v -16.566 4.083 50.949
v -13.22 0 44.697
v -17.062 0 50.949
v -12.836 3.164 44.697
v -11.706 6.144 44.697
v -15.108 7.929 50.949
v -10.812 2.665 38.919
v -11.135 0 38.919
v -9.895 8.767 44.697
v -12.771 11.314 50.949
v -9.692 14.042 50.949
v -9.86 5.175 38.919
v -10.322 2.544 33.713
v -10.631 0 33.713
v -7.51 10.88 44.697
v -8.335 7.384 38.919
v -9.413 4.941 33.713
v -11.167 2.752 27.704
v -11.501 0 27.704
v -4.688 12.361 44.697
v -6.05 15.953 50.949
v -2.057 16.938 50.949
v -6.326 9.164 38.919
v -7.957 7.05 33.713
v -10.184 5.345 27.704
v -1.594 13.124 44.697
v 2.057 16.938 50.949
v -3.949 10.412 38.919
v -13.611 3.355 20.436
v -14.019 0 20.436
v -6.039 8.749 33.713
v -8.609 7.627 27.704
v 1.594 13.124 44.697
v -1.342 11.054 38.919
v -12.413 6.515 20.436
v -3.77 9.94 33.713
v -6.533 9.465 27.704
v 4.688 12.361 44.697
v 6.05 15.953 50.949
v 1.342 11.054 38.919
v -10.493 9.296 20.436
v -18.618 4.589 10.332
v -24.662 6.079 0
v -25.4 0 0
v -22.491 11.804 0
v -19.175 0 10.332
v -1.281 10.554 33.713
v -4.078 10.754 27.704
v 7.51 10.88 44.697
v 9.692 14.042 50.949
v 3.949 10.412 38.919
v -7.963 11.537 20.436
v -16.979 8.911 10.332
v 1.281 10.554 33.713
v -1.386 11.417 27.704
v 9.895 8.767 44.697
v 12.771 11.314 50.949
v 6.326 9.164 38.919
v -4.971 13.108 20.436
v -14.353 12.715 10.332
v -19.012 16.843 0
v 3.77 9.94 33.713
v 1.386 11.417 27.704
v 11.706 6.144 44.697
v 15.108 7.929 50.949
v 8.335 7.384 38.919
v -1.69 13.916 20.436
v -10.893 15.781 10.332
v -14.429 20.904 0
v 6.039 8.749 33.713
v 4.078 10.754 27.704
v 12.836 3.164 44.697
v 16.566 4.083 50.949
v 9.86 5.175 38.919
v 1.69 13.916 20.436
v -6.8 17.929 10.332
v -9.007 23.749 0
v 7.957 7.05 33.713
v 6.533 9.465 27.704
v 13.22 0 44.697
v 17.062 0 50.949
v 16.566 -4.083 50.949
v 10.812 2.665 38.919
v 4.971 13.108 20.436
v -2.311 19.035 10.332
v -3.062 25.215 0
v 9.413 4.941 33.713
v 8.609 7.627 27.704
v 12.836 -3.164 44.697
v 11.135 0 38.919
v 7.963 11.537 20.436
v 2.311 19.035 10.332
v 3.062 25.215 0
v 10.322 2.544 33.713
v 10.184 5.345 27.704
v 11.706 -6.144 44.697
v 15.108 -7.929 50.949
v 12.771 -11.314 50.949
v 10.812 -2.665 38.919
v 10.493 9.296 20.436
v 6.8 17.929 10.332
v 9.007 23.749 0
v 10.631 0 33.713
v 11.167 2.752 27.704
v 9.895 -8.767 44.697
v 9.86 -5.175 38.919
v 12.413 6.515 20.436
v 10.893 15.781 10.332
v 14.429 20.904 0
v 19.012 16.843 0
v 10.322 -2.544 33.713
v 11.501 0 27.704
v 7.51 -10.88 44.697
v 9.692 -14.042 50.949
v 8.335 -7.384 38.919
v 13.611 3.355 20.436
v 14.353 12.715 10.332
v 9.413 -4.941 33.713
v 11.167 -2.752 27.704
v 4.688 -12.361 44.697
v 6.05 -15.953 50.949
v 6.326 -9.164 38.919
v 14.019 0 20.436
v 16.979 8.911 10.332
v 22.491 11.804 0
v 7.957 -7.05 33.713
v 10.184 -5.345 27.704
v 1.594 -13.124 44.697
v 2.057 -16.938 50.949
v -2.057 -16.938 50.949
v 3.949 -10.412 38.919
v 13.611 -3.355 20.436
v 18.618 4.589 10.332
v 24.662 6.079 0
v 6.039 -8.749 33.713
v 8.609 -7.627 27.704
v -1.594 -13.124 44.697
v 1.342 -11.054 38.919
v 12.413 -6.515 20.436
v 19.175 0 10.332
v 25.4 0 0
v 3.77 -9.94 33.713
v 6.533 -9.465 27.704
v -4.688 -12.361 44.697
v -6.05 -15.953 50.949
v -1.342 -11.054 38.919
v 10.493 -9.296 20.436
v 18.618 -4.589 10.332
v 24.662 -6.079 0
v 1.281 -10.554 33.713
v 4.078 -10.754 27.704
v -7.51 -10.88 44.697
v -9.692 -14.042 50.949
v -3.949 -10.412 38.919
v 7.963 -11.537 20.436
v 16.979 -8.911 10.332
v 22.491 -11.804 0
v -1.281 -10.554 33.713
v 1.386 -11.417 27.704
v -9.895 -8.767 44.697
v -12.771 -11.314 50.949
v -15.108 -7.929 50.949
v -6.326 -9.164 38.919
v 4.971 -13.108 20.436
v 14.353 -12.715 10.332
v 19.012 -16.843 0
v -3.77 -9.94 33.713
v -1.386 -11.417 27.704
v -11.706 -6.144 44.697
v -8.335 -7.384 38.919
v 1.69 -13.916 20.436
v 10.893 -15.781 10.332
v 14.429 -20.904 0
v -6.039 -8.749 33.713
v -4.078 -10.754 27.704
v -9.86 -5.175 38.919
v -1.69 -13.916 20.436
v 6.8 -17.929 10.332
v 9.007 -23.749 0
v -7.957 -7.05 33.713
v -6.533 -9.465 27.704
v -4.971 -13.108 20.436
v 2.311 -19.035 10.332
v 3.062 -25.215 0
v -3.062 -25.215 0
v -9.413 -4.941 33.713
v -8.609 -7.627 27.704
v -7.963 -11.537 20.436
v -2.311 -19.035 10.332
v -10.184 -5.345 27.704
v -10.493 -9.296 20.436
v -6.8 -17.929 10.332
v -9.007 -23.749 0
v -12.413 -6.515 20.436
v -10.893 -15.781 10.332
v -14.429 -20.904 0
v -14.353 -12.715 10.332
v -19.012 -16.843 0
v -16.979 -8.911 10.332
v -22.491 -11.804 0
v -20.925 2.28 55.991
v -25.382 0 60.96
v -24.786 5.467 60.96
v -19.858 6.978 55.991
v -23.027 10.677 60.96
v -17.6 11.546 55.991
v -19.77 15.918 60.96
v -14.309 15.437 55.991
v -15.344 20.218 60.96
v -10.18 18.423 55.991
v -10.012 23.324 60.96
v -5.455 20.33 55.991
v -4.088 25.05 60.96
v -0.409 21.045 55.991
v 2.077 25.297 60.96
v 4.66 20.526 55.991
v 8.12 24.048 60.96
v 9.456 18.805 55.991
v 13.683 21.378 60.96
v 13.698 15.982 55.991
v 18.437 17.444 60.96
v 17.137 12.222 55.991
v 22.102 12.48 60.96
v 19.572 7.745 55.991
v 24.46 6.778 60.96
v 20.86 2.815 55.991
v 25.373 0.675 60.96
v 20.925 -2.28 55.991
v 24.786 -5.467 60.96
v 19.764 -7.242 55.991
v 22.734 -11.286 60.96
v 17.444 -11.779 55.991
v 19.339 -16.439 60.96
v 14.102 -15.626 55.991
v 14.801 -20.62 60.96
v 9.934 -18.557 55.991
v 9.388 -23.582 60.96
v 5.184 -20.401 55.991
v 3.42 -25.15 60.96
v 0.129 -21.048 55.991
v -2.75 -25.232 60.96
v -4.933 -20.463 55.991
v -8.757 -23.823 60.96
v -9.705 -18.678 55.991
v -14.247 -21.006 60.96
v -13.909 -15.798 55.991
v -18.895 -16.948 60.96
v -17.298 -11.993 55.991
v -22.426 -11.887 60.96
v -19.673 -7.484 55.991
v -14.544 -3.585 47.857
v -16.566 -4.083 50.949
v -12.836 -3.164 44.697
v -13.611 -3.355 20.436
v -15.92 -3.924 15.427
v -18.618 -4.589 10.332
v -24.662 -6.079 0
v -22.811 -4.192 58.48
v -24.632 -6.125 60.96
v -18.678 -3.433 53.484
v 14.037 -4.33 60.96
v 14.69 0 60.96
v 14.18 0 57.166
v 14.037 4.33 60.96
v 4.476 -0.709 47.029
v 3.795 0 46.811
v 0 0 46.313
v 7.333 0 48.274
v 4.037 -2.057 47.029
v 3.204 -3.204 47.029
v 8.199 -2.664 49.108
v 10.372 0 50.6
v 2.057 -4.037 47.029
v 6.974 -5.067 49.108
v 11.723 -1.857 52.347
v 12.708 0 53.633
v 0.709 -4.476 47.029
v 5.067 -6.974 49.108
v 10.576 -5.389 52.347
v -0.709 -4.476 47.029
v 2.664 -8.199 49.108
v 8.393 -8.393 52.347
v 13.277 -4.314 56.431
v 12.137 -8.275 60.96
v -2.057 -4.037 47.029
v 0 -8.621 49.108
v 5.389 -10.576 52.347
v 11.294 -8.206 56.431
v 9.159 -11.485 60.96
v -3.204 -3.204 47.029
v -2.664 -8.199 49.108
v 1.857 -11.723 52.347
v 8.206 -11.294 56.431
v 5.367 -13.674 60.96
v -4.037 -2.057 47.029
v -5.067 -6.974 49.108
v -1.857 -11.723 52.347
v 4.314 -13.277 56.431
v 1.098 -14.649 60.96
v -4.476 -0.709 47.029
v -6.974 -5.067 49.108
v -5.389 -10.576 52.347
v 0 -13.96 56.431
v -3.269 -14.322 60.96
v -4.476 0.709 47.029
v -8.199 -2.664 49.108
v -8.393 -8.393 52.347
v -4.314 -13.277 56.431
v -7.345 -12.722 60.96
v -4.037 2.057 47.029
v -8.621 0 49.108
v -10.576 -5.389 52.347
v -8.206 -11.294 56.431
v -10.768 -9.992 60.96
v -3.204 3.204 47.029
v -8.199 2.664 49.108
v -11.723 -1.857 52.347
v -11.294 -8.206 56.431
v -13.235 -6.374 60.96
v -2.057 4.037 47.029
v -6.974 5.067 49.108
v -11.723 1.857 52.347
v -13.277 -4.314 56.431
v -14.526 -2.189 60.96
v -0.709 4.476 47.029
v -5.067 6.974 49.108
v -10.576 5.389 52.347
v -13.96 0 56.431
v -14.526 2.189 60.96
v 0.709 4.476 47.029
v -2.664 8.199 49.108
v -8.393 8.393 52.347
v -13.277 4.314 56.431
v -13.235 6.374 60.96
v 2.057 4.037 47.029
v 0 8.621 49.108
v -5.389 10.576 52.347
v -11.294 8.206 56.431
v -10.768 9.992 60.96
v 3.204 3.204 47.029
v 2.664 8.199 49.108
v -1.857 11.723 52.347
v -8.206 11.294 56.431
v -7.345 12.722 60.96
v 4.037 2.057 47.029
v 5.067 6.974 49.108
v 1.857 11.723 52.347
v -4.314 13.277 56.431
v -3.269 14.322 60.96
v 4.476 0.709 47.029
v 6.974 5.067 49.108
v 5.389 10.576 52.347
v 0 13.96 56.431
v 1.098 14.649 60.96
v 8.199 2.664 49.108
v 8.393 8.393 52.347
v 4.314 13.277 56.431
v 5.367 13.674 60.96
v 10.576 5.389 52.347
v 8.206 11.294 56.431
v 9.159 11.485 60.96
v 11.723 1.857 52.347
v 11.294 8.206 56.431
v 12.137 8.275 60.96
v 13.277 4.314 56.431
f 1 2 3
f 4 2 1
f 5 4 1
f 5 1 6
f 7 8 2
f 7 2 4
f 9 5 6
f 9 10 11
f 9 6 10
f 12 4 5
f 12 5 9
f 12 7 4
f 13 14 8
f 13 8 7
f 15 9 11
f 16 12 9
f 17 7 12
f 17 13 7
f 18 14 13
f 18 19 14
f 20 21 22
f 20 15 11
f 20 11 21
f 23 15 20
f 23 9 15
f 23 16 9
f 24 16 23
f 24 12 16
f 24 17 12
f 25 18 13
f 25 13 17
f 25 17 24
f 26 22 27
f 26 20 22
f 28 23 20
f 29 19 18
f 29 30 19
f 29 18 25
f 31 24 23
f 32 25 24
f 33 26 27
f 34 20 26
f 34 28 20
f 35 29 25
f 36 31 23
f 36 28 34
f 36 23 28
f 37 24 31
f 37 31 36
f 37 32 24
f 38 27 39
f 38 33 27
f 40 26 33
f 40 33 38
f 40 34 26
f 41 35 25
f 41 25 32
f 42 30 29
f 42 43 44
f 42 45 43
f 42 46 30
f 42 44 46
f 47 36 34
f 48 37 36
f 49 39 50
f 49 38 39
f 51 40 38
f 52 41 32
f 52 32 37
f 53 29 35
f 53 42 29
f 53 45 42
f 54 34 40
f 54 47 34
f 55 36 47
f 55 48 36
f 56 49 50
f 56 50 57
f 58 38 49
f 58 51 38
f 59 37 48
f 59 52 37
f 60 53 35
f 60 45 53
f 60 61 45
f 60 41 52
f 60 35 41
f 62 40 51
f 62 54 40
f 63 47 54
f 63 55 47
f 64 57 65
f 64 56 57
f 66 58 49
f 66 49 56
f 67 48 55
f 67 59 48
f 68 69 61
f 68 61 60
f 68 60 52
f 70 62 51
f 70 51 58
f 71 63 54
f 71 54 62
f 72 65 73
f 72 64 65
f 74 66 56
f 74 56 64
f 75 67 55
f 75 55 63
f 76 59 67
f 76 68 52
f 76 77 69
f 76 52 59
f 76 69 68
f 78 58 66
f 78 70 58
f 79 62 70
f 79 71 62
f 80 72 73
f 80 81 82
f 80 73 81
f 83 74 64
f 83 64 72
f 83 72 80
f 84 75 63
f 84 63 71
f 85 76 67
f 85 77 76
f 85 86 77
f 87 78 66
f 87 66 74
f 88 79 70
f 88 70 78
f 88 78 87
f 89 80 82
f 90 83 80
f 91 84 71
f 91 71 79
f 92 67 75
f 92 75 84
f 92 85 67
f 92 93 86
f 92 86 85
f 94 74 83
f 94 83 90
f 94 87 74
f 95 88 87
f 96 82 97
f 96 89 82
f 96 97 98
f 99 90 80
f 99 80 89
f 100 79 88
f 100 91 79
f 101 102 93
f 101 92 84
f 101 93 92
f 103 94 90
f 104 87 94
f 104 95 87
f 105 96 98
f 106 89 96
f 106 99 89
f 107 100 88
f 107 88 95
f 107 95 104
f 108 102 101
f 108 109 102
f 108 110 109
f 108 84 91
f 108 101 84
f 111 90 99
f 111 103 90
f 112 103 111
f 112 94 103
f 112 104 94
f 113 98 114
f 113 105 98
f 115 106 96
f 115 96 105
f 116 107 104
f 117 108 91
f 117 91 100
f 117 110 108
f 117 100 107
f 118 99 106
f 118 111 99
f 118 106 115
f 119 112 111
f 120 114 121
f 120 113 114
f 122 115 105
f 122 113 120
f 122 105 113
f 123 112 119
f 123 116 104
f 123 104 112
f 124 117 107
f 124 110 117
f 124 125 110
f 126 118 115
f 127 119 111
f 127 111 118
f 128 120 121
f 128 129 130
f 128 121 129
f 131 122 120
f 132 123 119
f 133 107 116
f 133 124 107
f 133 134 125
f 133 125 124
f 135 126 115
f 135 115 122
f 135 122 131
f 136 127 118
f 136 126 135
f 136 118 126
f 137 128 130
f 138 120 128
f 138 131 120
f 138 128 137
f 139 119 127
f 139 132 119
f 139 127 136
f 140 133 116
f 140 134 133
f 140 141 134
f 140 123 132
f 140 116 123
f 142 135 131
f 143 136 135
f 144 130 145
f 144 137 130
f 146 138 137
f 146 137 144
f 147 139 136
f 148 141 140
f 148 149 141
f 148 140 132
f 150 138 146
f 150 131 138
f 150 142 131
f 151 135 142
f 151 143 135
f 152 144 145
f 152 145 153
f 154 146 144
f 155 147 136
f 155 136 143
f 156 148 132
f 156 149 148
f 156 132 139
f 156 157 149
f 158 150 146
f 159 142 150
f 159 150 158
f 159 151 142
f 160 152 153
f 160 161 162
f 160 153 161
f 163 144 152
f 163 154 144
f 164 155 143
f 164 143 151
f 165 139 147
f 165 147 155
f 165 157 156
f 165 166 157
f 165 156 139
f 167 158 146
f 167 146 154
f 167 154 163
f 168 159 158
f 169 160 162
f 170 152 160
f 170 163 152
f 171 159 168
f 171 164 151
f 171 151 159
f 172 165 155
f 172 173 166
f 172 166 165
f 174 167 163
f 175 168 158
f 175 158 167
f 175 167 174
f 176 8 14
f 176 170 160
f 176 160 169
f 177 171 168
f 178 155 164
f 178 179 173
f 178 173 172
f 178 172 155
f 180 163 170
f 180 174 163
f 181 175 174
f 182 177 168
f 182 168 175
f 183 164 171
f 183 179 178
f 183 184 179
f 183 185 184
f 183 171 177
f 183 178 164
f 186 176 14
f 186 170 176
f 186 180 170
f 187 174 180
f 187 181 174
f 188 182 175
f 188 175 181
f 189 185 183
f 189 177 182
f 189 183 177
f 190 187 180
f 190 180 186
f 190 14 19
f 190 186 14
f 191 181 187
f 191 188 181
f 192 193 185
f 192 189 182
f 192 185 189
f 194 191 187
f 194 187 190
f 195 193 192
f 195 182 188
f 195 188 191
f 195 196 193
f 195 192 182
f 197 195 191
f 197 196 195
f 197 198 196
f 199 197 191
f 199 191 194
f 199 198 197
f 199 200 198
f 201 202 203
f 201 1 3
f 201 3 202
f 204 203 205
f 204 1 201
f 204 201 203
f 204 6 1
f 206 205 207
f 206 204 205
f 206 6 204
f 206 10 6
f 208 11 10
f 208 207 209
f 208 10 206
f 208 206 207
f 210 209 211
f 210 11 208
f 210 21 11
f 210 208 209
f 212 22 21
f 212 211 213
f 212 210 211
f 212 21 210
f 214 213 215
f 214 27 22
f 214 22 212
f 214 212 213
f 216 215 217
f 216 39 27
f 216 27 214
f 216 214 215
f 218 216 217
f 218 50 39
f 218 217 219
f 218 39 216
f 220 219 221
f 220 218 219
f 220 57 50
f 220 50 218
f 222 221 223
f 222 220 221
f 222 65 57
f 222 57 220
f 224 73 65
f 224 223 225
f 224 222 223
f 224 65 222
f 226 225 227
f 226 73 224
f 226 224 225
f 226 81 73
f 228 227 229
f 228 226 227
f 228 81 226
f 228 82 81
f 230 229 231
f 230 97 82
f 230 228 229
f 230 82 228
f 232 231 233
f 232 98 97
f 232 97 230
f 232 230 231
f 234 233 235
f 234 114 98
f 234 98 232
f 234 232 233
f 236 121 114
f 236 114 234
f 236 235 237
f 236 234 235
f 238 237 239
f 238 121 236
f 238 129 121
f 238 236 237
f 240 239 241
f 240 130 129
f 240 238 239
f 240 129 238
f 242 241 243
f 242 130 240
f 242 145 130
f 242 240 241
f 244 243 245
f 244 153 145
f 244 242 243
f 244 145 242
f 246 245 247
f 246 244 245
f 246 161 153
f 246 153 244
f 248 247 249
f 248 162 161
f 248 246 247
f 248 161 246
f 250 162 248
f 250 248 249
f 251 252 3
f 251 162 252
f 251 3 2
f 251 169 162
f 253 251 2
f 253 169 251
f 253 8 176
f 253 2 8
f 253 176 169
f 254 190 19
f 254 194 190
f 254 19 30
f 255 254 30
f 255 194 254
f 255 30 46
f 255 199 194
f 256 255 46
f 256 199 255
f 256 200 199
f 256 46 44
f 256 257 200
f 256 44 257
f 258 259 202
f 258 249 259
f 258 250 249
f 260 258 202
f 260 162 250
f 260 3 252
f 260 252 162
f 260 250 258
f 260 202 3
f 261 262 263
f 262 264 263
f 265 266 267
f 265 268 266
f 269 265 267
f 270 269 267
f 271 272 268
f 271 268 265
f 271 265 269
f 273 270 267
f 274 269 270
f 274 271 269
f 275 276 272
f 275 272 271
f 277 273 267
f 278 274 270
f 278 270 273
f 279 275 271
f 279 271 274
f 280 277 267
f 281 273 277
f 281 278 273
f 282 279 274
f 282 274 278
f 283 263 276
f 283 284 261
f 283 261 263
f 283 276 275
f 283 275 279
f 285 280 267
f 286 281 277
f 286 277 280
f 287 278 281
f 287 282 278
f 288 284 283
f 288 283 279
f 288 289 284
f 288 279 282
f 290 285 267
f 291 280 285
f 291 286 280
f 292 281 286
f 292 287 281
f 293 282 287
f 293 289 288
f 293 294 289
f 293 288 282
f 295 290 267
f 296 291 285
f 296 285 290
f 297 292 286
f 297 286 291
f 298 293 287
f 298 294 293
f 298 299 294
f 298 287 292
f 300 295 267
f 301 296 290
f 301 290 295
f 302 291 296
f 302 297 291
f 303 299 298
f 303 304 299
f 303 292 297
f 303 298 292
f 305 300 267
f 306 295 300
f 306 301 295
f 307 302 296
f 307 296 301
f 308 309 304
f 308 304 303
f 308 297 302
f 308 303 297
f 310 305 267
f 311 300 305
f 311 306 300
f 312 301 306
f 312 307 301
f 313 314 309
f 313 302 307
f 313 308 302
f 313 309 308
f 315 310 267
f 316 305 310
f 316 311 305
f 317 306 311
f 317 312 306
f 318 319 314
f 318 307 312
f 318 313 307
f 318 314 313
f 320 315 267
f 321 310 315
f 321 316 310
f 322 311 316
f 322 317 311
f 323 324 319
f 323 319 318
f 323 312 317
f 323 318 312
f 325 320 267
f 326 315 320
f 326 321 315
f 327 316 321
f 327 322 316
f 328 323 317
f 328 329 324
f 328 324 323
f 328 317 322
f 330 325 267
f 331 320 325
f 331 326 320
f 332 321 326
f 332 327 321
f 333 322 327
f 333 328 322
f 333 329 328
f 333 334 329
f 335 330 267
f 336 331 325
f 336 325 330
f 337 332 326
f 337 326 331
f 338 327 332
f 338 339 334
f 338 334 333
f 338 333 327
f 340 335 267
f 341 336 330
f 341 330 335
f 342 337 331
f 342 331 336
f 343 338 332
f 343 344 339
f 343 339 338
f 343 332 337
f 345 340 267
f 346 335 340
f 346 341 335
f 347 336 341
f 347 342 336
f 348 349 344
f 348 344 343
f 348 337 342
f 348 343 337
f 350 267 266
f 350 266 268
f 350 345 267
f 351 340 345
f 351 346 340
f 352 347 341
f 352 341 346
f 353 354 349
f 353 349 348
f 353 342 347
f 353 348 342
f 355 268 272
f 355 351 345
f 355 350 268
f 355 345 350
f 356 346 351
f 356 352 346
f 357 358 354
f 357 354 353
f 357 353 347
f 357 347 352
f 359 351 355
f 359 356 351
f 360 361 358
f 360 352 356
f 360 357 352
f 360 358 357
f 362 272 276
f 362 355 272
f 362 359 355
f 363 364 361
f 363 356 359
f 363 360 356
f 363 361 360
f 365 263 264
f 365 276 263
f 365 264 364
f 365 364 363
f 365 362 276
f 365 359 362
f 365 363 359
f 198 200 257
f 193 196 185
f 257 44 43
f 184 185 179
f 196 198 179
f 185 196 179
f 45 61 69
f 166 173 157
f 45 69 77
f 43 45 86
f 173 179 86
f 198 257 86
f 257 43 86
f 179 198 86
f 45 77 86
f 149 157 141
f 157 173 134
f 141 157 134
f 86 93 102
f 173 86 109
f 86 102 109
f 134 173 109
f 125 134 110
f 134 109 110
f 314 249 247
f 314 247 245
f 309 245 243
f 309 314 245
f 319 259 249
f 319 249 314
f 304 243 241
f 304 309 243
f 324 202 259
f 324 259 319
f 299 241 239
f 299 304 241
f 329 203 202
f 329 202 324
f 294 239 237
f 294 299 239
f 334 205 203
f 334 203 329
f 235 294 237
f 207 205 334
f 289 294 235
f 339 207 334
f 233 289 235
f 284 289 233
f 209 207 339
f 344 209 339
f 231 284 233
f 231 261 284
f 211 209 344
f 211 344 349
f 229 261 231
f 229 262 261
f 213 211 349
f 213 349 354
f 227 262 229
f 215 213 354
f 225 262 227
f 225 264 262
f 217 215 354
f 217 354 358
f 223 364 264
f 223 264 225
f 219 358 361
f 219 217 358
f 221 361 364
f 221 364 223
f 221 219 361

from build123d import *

# Parameters (mm, degrees)
F0_R     = 25.4
F1_DEPTH = 60.96


with BuildPart() as f1:
    # F0 (on Top) → F1 (new body)
    with BuildSketch(Plane.XY):
        Circle(F0_R)
    extrude(amount=F1_DEPTH)

    # F2 (on Front) → F3 (revolve, cut)
    with BuildSketch(Plane.XZ):
        with BuildLine():
            add(Edge.make_bspline(
                [(-25.4, 60.9805956483), (-18.3583153402, 53.032536083), (-3.2108389468, 35.9353426621), (-17.6651423767, 12.5266006439), (-25.4, 0)],
                knots=[0, 0, 0, 0, 0.4648751037, 1, 1, 1, 1], degree=3))
            Line((-25.4, 60.9805956483), (-25.4, 0))
        make_face()
    revolve(axis=Axis((0, 0, 17.4264528715), (0, 0, -1)), mode=Mode.SUBTRACT)

    # F4 (on Front) → F5 (revolve, cut)
    with BuildSketch(Plane.XZ):
        with BuildLine():
            Line((0, 75.6927165588), (0, 46.3127460876))
            ThreePointArc((0, 46.3127460876), (14.6899852356, 61.0027313232), (0, 75.6927165588))
        make_face()
    revolve(axis=Axis((0, 0, 61.0027313232), (0, 0, -1)), mode=Mode.SUBTRACT)


solid = f1.part
